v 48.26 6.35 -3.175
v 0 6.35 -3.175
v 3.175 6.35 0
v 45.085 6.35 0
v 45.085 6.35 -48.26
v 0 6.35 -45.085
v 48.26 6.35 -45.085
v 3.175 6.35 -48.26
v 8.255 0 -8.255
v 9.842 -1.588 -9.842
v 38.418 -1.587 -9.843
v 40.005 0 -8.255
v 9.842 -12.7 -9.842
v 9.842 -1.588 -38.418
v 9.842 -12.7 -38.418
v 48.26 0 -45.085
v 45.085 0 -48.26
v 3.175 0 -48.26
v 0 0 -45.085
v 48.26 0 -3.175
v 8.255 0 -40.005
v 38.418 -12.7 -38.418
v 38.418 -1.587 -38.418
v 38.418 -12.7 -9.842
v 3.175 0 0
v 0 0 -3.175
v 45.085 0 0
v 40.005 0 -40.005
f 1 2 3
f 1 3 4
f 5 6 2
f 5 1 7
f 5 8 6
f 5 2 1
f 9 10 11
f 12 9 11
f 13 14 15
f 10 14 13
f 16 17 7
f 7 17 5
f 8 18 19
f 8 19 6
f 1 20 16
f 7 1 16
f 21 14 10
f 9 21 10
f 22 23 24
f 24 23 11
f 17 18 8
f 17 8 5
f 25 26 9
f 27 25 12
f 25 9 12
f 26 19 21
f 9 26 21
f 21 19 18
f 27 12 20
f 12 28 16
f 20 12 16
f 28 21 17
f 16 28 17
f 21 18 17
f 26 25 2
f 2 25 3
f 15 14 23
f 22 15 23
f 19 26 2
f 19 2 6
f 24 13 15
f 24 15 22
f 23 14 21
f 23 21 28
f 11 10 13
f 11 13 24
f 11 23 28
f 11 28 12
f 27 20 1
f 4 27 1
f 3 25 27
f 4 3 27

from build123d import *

# Parameters (mm, degrees)
SKETCH1_W           = 48.26
SKETCH1_H           = 48.26
BOSS_EXTRUDE1_DEPTH = 6.35
CHAMFER1_SIZE       = 3.175
SKETCH4_W           = 28.575
SKETCH4_H           = 28.575
BOSS_EXTRUDE2_DEPTH = 12.7
CHAMFER2_SIZE       = 1.5875


with BuildPart() as part:
    # Sketch1 → Boss-Extrude1 (new body)
    with BuildSketch(Plane(origin=(0, 0, 0), x_dir=(1, 0, 0), z_dir=(0, 1, 0))):
        with Locations((24.13, 24.13)):
            Rectangle(SKETCH1_W, SKETCH1_H)
    extrude(amount=BOSS_EXTRUDE1_DEPTH)

    # Chamfer1
    chamfer1_edges = [part.edges().sort_by_distance(p)[0] for p in [
        (0, 3.175, -48.26),
        (48.26, 3.175, -48.26),
        (48.26, 3.175, 0),
        (0, 3.175, 0),
    ]]
    chamfer(chamfer1_edges, length=CHAMFER1_SIZE)

    # Sketch4 → Boss-Extrude2 (add)
    with BuildSketch(Plane.XZ):
        with Locations((24.13, -24.13)):
            Rectangle(SKETCH4_W, SKETCH4_H)
    extrude(amount=BOSS_EXTRUDE2_DEPTH)

    # Chamfer2
    chamfer2_edges = [part.edges().sort_by_distance(p)[0] for p in [
        (38.4175, 0, -24.13),
        (24.13, 0, -9.8425),
        (9.8425, 0, -24.13),
        (24.13, 0, -38.4175),
    ]]
    chamfer(chamfer2_edges, length=CHAMFER2_SIZE)


solid = part.part
